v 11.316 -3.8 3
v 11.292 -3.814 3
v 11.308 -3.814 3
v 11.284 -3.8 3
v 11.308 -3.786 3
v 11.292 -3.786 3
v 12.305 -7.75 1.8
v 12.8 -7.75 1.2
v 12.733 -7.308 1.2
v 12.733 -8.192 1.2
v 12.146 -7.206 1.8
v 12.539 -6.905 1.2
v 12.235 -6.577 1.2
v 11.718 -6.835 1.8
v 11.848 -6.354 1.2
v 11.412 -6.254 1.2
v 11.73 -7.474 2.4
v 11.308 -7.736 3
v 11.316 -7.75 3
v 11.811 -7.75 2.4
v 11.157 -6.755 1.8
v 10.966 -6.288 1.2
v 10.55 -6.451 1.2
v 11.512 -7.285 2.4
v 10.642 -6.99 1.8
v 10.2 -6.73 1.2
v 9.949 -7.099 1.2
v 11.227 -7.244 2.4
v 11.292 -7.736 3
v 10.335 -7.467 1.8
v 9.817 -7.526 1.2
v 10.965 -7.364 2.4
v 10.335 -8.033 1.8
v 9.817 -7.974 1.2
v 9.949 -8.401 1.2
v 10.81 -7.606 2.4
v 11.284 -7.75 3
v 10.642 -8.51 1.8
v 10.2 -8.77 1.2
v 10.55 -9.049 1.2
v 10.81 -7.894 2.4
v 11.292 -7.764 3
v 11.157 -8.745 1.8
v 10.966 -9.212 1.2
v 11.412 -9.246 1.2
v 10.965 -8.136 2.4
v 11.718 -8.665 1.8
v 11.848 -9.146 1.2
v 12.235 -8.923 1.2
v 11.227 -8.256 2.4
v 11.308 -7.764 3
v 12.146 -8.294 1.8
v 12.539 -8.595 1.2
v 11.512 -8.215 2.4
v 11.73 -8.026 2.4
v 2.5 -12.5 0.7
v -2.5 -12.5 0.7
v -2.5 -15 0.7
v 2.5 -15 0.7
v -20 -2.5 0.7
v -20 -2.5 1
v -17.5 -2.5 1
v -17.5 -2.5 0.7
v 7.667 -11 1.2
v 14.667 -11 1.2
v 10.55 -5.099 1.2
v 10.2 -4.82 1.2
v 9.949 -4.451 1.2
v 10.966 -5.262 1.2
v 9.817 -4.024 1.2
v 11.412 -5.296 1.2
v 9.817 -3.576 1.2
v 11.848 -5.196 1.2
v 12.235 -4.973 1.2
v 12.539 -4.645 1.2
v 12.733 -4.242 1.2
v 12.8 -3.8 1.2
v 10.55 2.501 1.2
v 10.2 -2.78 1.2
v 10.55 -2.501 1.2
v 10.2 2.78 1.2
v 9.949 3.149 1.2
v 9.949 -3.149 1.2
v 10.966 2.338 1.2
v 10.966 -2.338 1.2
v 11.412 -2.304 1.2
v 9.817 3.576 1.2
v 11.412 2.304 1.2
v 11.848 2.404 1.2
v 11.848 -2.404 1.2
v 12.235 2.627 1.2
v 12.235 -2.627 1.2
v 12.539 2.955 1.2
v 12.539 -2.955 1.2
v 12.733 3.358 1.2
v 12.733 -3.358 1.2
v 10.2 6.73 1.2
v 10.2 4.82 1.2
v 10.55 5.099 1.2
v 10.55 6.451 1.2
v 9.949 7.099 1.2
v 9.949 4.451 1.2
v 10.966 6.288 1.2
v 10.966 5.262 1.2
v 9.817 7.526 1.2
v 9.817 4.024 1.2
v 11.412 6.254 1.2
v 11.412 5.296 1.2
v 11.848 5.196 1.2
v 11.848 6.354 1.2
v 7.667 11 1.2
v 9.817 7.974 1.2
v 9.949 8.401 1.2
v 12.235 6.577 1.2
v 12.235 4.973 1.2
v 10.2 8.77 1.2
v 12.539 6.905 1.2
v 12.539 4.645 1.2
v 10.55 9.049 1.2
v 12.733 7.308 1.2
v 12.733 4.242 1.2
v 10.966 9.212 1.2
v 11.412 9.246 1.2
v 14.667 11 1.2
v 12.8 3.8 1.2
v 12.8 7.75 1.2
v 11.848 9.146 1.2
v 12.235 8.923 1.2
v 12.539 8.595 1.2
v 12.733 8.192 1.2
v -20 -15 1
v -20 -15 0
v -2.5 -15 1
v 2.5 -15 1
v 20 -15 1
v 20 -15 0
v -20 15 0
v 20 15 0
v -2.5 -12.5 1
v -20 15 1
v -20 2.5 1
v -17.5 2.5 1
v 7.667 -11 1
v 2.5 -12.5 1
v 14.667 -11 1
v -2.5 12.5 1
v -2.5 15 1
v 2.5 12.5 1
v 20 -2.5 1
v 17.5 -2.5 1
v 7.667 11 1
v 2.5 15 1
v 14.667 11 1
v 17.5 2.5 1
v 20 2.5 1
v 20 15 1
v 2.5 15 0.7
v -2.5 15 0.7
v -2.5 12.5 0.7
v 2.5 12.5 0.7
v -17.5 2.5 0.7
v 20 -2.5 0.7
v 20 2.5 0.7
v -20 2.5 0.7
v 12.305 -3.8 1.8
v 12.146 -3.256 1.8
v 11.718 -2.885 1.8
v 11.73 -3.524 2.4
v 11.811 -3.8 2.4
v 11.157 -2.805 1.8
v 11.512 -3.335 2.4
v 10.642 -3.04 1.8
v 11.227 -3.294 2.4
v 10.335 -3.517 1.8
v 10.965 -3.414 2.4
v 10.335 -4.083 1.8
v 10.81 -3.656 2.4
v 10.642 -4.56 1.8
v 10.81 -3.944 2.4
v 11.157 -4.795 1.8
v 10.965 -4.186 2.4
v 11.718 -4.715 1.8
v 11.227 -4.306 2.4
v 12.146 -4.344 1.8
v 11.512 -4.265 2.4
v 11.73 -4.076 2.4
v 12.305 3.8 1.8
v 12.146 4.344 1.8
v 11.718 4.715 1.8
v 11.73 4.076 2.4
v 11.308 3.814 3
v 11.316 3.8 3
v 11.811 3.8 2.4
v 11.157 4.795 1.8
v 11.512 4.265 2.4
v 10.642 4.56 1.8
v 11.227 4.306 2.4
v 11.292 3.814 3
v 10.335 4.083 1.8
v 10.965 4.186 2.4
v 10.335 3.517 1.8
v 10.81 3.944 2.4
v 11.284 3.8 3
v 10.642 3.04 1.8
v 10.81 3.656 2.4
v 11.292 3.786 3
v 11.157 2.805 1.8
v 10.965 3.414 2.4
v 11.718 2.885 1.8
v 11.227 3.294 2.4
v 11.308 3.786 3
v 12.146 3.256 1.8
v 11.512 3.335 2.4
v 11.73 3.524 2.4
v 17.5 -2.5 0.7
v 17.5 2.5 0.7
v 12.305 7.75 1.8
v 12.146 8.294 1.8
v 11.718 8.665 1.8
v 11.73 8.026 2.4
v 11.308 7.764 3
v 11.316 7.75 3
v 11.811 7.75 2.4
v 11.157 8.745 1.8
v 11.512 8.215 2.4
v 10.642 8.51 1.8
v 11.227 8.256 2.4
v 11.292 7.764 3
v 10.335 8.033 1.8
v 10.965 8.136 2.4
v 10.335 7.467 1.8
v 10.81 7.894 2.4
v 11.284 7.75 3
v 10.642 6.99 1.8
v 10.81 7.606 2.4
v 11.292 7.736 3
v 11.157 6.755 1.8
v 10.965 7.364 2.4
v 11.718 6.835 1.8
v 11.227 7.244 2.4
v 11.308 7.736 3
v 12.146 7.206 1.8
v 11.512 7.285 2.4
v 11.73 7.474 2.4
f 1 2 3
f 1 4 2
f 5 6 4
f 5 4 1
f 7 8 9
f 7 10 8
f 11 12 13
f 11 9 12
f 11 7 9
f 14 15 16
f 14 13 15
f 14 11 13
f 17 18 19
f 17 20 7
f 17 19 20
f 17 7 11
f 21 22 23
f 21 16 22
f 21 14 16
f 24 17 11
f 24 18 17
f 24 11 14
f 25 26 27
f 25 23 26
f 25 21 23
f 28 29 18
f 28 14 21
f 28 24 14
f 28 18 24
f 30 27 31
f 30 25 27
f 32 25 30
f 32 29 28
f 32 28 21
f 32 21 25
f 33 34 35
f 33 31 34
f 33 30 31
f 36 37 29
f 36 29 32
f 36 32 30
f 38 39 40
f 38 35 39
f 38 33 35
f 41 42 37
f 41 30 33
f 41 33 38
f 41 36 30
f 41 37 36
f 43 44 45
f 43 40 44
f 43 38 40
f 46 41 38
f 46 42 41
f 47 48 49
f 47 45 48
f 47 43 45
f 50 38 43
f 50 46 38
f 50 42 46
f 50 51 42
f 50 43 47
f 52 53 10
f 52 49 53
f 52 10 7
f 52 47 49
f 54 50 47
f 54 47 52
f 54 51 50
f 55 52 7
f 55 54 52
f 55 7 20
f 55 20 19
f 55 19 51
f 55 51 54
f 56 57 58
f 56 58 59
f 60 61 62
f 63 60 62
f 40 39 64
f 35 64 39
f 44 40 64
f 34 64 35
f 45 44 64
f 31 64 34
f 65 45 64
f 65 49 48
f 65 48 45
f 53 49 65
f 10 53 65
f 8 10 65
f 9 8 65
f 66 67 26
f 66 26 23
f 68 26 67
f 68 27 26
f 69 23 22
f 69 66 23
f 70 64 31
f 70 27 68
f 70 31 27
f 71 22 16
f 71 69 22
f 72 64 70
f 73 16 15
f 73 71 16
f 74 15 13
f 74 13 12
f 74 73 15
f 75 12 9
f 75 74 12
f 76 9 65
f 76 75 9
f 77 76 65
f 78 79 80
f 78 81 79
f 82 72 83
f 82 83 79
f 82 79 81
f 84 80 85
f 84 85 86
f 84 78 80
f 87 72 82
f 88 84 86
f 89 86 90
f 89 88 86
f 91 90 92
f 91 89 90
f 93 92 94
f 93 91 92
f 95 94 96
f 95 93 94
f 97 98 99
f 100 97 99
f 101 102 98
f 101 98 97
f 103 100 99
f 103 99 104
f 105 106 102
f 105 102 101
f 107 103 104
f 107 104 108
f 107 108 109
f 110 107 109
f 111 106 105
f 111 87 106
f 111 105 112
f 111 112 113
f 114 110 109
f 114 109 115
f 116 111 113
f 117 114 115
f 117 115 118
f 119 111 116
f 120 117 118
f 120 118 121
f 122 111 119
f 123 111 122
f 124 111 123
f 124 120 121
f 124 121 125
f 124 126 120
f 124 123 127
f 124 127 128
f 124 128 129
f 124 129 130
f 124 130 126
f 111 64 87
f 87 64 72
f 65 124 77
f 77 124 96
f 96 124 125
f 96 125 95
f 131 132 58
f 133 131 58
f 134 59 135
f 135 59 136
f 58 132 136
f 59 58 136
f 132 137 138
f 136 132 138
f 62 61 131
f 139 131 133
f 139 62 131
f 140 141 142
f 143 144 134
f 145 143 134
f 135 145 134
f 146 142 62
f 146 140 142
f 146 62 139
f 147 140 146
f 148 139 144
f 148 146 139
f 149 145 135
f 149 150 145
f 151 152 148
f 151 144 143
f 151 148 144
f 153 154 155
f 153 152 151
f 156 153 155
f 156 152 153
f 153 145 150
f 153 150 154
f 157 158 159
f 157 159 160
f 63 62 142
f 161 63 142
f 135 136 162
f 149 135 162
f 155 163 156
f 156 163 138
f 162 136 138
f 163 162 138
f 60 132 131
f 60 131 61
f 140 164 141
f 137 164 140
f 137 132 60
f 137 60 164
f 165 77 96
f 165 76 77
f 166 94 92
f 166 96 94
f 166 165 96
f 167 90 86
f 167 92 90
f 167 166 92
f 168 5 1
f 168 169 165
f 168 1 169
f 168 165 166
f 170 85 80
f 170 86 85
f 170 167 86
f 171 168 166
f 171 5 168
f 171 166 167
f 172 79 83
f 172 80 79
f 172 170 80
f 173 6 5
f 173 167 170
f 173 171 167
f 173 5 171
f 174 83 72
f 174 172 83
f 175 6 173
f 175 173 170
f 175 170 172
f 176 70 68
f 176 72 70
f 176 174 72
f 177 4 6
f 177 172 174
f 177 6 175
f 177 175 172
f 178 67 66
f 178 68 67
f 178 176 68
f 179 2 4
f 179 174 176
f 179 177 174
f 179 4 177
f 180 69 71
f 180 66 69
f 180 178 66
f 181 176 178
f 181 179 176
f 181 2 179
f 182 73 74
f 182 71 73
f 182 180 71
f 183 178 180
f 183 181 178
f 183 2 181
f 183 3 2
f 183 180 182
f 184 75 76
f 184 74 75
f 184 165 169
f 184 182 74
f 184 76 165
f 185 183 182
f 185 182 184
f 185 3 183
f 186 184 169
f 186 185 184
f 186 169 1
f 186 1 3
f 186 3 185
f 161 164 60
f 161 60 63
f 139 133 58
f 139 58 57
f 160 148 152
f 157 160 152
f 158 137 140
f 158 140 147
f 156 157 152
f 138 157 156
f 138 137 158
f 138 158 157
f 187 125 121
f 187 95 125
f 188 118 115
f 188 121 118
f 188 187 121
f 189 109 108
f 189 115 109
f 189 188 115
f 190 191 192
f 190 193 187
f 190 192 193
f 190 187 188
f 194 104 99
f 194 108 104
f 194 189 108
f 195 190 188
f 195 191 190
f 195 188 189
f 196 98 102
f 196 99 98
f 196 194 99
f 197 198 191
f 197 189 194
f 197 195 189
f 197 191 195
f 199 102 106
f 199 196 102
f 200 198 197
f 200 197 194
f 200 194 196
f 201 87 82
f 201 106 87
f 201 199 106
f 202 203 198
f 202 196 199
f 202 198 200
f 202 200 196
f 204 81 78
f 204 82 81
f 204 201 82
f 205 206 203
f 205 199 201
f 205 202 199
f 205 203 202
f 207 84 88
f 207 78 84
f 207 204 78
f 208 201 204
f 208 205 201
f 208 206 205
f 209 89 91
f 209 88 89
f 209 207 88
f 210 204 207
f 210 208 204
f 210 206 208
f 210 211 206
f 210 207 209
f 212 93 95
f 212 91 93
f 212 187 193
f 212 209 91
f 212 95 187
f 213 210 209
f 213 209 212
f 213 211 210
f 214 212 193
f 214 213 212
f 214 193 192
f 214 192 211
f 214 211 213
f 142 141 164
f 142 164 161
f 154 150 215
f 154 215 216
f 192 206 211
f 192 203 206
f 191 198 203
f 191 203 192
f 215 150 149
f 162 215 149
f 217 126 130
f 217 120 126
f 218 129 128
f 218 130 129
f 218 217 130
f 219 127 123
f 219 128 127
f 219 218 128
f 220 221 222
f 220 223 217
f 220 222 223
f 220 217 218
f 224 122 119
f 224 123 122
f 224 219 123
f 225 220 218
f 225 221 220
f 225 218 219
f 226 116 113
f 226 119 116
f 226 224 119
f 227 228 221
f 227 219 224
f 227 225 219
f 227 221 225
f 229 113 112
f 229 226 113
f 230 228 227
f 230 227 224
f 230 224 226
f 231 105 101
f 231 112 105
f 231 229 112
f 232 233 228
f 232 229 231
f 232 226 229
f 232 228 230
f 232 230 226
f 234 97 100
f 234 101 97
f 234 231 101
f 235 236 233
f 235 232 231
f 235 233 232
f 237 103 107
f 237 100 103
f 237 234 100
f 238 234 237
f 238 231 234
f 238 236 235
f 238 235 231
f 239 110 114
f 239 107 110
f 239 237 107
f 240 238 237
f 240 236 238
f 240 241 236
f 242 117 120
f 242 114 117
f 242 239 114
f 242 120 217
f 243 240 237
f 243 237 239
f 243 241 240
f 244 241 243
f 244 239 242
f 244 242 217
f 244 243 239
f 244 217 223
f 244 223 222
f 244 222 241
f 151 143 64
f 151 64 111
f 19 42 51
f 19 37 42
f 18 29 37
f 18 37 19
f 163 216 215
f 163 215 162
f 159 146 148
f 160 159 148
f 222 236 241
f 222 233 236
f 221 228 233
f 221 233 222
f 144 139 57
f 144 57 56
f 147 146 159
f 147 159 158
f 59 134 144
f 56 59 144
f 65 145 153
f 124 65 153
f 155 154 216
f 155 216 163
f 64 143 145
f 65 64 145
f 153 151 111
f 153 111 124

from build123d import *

# Parameters (mm, degrees)
SKETCH1_W           = 40
SKETCH1_H           = 30
BOSS_EXTRUDE1_DEPTH = 1
SKETCH1_4_W         = 7
SKETCH1_4_H         = 22
BOSS_EXTRUDE2_DEPTH = 1.2
SKETCH2_W           = 5
SKETCH2_H           = 2.5
SKETCH2_W_2         = 2.5
SKETCH2_H_2         = 5
CUT_EXTRUDE15_DEPTH = 0.3
SKETCH3_R           = 1.5
BOSS_EXTRUDE3_DEPTH = 1.8
BOSS_EXTRUDE3_TAPER = 39.5


with BuildPart() as part:
    # Sketch1 → Boss-Extrude1 (new body)
    with BuildSketch(Plane.XY):
        Rectangle(SKETCH1_W, SKETCH1_H)
    extrude(amount=BOSS_EXTRUDE1_DEPTH)

    # Sketch1_4 → Boss-Extrude2 (add)
    with BuildSketch(Plane.XY):
        with Locations((11.166666667, 0)):
            Rectangle(SKETCH1_4_W, SKETCH1_4_H)
    extrude(amount=BOSS_EXTRUDE2_DEPTH)

    # Sketch2 → Cut-Extrude15 (cut)
    with BuildSketch(Plane.XY.offset(1)):
        with Locations((0, -13.75)):
            Rectangle(SKETCH2_W, SKETCH2_H)
        with Locations((-18.75, 0)):
            Rectangle(SKETCH2_W_2, SKETCH2_H_2)
        with Locations((18.75, 0)):
            Rectangle(SKETCH2_W_2, SKETCH2_H_2)
        with Locations((0, 13.75)):
            Rectangle(SKETCH2_W, SKETCH2_H)
    extrude(amount=-CUT_EXTRUDE15_DEPTH, mode=Mode.SUBTRACT)

    # Sketch3 → Boss-Extrude3 (add)
    with BuildSketch(Plane.XY.offset(1.2)):
        with Locations((11.3, -7.75)):
            Circle(SKETCH3_R)
        with Locations((11.3, -3.8)):
            Circle(SKETCH3_R)
        with Locations((11.3, 3.8)):
            Circle(SKETCH3_R)
        with Locations((11.3, 7.75)):
            Circle(SKETCH3_R)
    extrude(amount=BOSS_EXTRUDE3_DEPTH, taper=BOSS_EXTRUDE3_TAPER)


solid = part.part
